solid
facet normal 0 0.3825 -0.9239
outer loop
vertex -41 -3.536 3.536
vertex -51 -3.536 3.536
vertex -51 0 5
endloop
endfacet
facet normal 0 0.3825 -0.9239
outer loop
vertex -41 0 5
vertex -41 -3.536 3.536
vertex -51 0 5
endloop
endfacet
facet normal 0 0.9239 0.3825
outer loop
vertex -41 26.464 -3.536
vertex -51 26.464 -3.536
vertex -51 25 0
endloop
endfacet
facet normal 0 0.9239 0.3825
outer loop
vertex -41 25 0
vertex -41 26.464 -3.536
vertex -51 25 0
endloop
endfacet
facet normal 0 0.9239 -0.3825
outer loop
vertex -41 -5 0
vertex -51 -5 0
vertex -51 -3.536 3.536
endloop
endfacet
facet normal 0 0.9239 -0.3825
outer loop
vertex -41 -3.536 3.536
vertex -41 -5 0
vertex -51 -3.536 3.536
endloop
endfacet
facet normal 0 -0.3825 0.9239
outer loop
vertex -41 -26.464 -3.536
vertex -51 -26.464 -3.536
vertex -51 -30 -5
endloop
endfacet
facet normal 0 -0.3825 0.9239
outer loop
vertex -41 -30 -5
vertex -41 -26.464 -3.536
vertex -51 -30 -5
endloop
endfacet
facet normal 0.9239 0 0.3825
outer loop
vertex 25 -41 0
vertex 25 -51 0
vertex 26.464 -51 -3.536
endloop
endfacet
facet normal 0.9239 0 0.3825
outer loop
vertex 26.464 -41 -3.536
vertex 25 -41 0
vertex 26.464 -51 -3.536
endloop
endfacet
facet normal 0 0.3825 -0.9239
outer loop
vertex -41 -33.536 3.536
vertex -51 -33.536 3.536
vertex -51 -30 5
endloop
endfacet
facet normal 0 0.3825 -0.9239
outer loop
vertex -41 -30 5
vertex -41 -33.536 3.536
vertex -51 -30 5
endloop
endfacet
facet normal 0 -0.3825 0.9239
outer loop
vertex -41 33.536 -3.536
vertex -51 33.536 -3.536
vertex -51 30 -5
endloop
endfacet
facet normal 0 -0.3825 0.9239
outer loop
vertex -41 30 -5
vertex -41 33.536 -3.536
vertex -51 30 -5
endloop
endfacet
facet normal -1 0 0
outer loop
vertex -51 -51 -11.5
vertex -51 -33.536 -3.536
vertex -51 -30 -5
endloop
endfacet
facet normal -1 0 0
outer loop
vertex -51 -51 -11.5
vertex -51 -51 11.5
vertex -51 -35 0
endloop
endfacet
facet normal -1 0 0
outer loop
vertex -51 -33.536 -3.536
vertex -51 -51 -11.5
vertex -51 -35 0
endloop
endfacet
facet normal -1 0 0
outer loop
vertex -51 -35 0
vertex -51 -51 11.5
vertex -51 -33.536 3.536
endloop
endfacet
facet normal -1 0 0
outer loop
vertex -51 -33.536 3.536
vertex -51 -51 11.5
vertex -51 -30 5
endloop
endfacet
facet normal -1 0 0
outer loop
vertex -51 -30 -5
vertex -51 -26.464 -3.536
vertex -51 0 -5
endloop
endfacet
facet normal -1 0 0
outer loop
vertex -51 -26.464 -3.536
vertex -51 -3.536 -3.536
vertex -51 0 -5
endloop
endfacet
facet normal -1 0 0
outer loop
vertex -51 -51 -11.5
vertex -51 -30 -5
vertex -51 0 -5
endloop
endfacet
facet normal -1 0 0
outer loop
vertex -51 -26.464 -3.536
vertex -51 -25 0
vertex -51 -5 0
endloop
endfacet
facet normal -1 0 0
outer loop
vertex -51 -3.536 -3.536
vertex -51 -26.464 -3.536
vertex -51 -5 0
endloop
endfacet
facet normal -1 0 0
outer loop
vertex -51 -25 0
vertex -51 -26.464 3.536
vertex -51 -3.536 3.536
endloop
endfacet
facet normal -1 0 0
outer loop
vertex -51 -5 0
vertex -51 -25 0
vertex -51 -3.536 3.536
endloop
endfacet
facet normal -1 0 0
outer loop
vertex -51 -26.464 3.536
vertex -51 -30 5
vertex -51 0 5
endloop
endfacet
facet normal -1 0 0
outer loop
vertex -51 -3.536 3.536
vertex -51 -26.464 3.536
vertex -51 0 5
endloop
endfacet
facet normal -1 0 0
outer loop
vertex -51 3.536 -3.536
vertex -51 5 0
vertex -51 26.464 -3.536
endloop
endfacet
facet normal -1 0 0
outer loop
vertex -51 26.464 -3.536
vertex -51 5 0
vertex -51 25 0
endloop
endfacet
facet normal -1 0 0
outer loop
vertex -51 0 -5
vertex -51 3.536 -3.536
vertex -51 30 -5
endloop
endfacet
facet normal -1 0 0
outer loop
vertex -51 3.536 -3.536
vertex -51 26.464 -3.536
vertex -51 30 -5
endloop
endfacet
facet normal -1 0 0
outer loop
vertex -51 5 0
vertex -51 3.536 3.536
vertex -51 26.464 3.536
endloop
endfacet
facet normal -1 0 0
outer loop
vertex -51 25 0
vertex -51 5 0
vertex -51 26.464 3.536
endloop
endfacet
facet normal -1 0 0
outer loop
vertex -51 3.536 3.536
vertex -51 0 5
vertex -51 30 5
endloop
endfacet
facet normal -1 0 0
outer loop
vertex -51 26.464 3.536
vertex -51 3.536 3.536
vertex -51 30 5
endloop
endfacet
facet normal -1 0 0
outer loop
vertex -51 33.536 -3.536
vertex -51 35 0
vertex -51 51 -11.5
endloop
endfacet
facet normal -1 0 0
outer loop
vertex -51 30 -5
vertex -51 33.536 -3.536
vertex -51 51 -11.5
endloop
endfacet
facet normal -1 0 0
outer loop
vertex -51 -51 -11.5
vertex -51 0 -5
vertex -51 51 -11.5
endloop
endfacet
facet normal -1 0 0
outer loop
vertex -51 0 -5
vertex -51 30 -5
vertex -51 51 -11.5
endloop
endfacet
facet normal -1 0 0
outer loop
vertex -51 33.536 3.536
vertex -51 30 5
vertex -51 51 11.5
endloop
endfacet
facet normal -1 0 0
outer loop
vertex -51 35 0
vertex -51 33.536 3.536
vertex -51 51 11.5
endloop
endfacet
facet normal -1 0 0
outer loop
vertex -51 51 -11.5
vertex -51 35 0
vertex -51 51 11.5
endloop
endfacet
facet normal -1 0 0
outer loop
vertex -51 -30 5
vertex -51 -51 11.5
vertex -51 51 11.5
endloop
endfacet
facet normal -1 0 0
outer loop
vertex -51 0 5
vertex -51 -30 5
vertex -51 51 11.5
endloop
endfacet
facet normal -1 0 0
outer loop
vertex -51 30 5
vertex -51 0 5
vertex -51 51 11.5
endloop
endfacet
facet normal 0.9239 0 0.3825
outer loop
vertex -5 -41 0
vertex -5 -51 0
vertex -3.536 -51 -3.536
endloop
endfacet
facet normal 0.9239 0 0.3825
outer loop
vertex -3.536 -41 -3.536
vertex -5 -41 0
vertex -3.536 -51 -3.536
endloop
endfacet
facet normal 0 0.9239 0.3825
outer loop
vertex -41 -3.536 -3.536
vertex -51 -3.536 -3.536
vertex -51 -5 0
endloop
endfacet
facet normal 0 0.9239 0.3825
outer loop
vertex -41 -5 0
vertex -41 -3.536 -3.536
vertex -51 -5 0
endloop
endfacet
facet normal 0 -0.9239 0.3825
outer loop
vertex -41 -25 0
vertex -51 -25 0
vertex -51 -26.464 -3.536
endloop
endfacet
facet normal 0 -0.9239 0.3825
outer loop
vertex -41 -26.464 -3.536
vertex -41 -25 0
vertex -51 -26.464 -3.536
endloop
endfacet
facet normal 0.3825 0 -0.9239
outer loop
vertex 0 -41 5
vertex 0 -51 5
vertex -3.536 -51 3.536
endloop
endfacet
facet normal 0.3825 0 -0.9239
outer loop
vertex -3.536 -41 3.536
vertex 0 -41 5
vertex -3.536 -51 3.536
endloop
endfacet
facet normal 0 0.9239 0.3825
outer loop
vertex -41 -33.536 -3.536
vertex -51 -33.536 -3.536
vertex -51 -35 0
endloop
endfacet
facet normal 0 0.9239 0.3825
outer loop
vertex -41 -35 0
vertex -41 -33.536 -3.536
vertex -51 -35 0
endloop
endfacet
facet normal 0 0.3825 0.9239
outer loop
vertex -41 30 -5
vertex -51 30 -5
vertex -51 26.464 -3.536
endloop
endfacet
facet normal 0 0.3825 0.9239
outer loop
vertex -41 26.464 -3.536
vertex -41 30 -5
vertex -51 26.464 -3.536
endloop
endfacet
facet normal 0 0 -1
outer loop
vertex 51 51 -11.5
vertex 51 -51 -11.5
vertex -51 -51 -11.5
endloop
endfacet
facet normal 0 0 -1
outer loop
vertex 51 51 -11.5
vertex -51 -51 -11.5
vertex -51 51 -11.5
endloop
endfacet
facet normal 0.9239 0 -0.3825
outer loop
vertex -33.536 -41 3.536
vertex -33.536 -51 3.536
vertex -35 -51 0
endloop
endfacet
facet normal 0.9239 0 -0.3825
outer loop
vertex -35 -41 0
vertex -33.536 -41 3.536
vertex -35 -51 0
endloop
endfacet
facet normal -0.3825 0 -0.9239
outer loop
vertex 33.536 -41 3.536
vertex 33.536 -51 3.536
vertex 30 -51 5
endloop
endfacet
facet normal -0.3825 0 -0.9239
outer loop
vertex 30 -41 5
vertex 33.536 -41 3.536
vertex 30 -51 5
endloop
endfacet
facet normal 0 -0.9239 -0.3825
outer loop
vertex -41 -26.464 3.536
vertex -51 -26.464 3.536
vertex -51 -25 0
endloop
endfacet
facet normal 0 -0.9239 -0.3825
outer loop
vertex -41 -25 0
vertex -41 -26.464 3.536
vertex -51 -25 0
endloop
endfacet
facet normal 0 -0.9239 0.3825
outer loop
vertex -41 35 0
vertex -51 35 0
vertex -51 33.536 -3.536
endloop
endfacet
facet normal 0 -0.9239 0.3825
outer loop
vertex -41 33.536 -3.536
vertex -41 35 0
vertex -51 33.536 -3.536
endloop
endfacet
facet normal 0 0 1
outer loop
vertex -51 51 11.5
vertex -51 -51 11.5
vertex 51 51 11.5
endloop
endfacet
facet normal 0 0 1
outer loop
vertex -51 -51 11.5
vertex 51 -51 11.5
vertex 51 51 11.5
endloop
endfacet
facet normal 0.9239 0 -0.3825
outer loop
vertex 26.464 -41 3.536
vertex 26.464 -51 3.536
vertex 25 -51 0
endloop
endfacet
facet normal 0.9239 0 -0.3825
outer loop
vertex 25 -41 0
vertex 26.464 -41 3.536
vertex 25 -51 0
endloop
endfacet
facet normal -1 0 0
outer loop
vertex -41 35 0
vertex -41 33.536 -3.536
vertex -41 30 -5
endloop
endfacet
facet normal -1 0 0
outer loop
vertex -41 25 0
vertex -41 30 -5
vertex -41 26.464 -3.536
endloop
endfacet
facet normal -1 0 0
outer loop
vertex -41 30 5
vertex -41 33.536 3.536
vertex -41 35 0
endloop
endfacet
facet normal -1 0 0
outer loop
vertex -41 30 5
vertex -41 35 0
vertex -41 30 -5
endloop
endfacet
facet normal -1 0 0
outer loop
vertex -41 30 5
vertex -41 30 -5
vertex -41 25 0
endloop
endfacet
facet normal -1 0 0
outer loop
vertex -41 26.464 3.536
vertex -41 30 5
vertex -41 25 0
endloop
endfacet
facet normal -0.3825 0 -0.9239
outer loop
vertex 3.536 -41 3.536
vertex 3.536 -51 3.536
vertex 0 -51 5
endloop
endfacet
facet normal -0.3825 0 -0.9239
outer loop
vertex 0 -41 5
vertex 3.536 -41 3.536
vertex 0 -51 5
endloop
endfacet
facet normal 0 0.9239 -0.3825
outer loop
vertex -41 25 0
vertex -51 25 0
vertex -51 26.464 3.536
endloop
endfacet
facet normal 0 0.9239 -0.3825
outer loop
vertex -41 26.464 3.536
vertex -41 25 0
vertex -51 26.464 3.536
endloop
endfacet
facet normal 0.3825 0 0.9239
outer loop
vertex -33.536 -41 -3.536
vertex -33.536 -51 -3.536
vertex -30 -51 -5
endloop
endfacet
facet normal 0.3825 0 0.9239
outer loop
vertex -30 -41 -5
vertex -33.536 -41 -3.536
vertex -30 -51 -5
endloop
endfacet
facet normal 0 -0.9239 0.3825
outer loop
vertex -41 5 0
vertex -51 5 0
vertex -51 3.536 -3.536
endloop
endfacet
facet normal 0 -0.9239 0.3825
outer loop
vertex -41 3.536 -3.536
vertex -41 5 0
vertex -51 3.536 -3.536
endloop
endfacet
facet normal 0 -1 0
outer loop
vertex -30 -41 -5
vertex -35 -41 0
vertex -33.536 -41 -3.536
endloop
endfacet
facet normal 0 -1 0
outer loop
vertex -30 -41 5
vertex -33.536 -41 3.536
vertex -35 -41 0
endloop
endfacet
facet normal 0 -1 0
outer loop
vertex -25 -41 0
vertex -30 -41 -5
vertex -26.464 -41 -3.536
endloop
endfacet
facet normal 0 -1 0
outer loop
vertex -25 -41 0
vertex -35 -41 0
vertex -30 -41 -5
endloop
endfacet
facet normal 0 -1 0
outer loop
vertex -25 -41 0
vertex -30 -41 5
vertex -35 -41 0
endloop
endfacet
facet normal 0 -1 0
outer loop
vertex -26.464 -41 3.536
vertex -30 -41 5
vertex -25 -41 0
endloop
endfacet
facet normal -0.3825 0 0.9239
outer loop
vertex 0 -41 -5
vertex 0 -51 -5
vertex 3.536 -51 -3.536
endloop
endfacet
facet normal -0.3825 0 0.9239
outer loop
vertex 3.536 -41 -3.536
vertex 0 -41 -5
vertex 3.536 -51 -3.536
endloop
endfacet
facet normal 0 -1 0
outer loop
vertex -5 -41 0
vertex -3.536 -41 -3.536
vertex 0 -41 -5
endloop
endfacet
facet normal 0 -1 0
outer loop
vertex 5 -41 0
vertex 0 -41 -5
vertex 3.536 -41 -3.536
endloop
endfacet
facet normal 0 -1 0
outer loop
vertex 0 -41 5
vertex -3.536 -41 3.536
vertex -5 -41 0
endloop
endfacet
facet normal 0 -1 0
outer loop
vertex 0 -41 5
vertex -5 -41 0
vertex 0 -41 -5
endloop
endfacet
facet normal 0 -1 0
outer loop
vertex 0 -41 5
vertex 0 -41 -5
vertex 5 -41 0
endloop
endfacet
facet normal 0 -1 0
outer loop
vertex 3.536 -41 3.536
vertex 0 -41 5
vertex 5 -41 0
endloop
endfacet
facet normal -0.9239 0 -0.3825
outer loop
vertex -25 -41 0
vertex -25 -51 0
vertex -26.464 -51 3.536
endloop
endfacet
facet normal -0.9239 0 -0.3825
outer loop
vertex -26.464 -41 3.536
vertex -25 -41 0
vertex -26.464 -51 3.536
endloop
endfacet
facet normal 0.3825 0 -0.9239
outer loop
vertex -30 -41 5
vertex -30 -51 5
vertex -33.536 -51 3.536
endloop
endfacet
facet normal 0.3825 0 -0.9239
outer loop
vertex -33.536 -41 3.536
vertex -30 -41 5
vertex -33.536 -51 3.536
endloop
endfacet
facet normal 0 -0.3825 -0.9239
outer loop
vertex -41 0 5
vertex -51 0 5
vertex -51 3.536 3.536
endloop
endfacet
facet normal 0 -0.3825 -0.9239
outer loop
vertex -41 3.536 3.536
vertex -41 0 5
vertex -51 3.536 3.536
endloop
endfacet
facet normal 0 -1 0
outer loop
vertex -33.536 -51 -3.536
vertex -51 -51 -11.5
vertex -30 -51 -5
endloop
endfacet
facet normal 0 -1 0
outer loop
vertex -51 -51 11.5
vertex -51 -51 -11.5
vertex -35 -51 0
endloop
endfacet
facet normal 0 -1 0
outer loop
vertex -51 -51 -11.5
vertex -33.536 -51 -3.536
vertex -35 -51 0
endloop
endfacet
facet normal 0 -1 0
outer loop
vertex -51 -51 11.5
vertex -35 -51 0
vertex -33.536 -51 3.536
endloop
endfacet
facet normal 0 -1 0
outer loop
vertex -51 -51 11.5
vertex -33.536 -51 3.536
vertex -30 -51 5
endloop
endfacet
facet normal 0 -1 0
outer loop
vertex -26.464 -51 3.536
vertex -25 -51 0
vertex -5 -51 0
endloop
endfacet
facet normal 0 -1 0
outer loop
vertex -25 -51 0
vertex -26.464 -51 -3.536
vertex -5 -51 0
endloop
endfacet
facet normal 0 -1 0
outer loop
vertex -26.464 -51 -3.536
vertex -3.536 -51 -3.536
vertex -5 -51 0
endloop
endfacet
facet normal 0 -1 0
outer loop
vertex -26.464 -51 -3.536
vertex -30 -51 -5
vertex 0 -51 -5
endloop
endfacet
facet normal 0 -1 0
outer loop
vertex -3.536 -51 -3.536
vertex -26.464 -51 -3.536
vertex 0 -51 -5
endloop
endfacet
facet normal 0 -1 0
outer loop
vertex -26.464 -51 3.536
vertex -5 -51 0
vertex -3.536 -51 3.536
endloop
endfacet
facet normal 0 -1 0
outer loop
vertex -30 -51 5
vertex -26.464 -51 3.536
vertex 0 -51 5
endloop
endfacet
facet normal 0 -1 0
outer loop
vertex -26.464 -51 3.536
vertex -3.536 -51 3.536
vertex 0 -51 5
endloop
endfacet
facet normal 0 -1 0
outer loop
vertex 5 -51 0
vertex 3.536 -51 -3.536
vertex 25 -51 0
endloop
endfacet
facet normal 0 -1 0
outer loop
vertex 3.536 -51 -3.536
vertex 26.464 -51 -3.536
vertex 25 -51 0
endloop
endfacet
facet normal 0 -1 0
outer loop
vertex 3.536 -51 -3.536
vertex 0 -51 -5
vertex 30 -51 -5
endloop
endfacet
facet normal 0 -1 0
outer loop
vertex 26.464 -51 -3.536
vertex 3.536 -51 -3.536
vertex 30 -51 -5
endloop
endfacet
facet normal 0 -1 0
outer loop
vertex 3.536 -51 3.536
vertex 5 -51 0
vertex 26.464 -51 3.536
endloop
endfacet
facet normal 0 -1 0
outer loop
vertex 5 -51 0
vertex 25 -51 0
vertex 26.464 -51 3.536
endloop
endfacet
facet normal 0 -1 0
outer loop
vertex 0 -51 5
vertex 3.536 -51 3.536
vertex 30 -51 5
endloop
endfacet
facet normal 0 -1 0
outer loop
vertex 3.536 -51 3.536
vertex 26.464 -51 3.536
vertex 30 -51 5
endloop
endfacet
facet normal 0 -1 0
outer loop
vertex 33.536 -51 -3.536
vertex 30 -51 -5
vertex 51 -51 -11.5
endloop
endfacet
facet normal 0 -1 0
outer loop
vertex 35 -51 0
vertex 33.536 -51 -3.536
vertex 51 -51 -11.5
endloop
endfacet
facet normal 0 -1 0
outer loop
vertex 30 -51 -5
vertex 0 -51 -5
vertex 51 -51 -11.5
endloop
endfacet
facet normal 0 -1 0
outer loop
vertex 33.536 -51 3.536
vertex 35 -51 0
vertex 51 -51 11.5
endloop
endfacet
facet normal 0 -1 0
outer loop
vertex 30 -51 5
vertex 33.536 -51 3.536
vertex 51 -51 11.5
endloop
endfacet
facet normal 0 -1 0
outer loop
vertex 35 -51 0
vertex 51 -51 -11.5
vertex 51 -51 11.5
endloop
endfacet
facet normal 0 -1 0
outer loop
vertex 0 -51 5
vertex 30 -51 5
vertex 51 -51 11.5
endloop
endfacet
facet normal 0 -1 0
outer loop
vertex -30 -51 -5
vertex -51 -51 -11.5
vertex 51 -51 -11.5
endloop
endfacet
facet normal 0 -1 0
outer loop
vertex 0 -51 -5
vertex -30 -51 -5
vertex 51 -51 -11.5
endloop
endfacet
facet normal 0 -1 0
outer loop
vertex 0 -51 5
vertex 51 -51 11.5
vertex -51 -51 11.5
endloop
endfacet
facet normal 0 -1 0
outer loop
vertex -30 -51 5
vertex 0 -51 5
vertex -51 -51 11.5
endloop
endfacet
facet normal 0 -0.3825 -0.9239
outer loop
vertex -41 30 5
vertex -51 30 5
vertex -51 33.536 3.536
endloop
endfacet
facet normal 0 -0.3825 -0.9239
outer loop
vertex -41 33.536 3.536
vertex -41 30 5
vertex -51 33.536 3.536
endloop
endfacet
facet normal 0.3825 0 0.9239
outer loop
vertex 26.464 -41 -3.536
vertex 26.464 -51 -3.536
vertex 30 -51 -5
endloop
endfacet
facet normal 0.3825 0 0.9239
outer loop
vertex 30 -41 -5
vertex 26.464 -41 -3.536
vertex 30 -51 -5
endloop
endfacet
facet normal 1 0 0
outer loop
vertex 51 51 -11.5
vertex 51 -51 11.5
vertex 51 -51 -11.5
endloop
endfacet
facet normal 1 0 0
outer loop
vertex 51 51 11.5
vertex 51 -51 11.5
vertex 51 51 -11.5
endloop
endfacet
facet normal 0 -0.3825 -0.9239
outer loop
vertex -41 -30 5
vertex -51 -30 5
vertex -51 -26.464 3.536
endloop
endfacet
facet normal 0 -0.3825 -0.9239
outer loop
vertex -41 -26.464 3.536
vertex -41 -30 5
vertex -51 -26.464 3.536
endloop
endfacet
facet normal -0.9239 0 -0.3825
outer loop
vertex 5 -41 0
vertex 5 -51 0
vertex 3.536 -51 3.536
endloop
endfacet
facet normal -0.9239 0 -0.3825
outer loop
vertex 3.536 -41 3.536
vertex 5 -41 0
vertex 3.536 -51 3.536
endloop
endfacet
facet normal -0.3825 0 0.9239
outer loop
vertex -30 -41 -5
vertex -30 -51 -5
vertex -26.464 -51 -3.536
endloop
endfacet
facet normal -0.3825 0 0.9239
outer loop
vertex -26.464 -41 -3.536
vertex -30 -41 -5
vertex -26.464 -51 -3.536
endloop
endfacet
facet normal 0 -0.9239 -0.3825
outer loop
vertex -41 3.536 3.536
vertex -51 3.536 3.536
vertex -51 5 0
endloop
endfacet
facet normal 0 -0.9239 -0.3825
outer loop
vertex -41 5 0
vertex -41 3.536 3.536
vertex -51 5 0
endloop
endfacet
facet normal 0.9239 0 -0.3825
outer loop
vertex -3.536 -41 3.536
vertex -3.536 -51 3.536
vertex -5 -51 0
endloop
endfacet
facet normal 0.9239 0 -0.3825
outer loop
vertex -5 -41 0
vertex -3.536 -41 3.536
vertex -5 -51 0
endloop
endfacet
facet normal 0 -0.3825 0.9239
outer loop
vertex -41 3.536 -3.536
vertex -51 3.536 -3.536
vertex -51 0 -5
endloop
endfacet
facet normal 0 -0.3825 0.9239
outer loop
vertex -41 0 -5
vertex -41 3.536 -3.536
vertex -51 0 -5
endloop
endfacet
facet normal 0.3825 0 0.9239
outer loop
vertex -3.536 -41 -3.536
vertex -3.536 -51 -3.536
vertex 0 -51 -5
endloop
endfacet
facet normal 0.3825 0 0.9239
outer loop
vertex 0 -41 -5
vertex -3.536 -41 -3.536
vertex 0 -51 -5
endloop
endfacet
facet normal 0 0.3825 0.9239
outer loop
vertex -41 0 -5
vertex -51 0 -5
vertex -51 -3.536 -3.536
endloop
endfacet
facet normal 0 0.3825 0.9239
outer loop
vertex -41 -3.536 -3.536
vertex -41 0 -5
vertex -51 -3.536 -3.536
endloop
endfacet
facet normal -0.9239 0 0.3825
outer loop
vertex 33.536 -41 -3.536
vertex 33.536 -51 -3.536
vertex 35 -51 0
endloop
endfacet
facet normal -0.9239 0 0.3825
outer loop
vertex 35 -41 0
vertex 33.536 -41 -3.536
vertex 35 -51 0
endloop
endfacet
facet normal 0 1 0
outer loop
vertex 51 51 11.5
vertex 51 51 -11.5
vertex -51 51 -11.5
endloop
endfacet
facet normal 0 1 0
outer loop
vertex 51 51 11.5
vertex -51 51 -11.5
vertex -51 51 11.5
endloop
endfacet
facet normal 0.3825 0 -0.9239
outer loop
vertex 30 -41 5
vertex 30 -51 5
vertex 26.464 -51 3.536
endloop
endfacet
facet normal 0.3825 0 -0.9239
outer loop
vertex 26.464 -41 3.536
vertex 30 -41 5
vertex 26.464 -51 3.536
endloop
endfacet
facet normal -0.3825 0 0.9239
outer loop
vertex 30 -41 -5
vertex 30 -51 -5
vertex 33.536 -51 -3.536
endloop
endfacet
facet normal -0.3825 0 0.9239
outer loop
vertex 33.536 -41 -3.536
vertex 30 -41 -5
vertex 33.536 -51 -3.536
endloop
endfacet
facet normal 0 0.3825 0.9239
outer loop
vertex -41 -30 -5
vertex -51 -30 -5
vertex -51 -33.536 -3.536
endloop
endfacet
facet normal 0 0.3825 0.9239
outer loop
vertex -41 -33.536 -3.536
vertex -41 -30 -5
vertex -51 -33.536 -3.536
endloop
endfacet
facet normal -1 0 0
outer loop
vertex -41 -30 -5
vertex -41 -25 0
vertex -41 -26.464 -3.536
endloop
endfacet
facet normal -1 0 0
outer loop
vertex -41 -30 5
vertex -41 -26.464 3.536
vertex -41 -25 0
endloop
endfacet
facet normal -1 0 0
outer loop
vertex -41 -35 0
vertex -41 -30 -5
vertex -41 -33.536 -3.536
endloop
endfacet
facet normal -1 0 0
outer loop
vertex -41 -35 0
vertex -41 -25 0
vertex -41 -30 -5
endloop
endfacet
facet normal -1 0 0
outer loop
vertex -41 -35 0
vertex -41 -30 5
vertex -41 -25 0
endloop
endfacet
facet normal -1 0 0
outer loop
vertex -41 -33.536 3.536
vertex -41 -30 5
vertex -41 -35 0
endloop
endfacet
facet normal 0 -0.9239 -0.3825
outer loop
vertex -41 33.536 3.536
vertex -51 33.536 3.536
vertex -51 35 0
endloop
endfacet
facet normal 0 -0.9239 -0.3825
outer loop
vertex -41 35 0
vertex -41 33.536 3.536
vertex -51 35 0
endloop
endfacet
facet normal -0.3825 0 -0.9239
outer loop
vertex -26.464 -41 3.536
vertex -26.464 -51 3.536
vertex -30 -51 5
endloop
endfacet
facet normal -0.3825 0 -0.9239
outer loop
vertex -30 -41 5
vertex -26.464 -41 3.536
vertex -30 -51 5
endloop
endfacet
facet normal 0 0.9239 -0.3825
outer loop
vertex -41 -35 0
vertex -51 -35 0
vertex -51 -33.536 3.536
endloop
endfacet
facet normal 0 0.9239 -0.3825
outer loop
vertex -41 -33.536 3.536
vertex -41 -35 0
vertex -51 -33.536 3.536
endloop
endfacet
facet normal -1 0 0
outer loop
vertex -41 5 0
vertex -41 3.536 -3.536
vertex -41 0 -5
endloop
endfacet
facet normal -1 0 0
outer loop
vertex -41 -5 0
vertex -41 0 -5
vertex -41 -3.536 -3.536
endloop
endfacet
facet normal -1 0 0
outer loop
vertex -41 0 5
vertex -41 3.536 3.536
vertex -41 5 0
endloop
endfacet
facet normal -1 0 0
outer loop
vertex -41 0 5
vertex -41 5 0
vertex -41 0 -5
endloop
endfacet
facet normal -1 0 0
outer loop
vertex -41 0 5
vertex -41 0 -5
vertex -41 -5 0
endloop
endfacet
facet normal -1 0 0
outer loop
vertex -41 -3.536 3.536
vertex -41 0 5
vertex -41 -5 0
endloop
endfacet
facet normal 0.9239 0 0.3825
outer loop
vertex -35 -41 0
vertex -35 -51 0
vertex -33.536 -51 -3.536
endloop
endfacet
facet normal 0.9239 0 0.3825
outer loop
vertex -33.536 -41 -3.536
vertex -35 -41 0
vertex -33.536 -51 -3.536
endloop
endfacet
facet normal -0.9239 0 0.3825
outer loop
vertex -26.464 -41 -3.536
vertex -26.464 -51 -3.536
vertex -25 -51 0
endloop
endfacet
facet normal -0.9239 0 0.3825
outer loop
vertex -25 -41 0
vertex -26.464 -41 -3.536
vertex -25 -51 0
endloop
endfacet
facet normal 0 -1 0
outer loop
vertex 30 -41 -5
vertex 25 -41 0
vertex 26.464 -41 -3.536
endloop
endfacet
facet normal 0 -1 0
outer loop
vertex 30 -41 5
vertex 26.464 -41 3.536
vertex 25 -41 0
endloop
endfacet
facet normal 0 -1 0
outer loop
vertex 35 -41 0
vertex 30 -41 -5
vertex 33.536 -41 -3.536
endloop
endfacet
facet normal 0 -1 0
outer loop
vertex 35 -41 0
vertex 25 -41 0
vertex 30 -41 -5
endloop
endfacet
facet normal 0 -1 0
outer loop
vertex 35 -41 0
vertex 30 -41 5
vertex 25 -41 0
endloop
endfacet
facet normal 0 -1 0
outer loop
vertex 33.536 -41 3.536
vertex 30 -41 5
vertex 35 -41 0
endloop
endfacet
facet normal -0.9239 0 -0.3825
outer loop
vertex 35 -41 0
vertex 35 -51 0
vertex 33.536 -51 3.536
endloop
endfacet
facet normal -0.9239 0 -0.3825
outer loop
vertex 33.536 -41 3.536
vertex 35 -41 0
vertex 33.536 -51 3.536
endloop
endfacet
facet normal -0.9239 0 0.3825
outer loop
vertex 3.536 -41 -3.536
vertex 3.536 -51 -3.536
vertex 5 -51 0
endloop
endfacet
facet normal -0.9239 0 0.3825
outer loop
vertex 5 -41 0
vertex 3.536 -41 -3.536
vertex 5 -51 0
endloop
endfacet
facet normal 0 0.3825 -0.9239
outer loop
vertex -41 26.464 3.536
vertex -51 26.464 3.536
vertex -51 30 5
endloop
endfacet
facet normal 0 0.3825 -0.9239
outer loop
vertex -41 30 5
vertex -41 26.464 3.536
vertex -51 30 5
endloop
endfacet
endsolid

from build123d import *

# Parameters (mm, degrees)
F0_W     = 102
F0_H     = 23
F1_DEPTH = 51
F3_DEPTH = 10
F5_DEPTH = 10


with BuildPart() as f1:
    # F0 (on Right) → F1 (new body, symmetric)
    with BuildSketch(Plane.YZ):
        Rectangle(F0_W, F0_H)
    extrude(amount=F1_DEPTH, both=True)

    # F2 (on face) → F3 (cut)
    with BuildSketch(Plane.XZ.offset(51)):
        Polygon((3.535534, -3.535534), (5, 0), (3.535534, 3.535534), (0, 5), (-3.535534, 3.535534), (-5, 0), (-3.535534, -3.535534), (0, -5), align=None)
        Polygon((33.535534, 3.535534), (30, 5), (26.464466, 3.535534), (25, 0), (26.464466, -3.535534), (30, -5), (33.535534, -3.535534), (35, 0), align=None)
        Polygon((-26.464466, 3.535534), (-30, 5), (-33.535534, 3.535534), (-35, 0), (-33.535534, -3.535534), (-30, -5), (-26.464466, -3.535534), (-25, 0), align=None)
    extrude(amount=-F3_DEPTH, mode=Mode.SUBTRACT)

    # F4 (on face) → F5 (cut)
    with BuildSketch(Plane(origin=(-51, 0, 0), x_dir=(0, -1, 0), z_dir=(-1, 0, 0))):
        Polygon((3.535534, -3.535534), (5, 0), (3.535534, 3.535534), (0, 5), (-3.535534, 3.535534), (-5, 0), (-3.535534, -3.535534), (0, -5), align=None)
        Polygon((30, 5), (26.464466, 3.535534), (25, 0), (26.464466, -3.535534), (30, -5), (33.535534, -3.535534), (35, 0), (33.535534, 3.535534), align=None)
        Polygon((-25, 0), (-26.464466, 3.535534), (-30, 5), (-33.535534, 3.535534), (-35, 0), (-33.535534, -3.535534), (-30, -5), (-26.464466, -3.535534), align=None)
    extrude(amount=-F5_DEPTH, mode=Mode.SUBTRACT)


with BuildPart() as f6_1:
    # F6: copy of F1
    add(f1.part)


solid = f1.part
